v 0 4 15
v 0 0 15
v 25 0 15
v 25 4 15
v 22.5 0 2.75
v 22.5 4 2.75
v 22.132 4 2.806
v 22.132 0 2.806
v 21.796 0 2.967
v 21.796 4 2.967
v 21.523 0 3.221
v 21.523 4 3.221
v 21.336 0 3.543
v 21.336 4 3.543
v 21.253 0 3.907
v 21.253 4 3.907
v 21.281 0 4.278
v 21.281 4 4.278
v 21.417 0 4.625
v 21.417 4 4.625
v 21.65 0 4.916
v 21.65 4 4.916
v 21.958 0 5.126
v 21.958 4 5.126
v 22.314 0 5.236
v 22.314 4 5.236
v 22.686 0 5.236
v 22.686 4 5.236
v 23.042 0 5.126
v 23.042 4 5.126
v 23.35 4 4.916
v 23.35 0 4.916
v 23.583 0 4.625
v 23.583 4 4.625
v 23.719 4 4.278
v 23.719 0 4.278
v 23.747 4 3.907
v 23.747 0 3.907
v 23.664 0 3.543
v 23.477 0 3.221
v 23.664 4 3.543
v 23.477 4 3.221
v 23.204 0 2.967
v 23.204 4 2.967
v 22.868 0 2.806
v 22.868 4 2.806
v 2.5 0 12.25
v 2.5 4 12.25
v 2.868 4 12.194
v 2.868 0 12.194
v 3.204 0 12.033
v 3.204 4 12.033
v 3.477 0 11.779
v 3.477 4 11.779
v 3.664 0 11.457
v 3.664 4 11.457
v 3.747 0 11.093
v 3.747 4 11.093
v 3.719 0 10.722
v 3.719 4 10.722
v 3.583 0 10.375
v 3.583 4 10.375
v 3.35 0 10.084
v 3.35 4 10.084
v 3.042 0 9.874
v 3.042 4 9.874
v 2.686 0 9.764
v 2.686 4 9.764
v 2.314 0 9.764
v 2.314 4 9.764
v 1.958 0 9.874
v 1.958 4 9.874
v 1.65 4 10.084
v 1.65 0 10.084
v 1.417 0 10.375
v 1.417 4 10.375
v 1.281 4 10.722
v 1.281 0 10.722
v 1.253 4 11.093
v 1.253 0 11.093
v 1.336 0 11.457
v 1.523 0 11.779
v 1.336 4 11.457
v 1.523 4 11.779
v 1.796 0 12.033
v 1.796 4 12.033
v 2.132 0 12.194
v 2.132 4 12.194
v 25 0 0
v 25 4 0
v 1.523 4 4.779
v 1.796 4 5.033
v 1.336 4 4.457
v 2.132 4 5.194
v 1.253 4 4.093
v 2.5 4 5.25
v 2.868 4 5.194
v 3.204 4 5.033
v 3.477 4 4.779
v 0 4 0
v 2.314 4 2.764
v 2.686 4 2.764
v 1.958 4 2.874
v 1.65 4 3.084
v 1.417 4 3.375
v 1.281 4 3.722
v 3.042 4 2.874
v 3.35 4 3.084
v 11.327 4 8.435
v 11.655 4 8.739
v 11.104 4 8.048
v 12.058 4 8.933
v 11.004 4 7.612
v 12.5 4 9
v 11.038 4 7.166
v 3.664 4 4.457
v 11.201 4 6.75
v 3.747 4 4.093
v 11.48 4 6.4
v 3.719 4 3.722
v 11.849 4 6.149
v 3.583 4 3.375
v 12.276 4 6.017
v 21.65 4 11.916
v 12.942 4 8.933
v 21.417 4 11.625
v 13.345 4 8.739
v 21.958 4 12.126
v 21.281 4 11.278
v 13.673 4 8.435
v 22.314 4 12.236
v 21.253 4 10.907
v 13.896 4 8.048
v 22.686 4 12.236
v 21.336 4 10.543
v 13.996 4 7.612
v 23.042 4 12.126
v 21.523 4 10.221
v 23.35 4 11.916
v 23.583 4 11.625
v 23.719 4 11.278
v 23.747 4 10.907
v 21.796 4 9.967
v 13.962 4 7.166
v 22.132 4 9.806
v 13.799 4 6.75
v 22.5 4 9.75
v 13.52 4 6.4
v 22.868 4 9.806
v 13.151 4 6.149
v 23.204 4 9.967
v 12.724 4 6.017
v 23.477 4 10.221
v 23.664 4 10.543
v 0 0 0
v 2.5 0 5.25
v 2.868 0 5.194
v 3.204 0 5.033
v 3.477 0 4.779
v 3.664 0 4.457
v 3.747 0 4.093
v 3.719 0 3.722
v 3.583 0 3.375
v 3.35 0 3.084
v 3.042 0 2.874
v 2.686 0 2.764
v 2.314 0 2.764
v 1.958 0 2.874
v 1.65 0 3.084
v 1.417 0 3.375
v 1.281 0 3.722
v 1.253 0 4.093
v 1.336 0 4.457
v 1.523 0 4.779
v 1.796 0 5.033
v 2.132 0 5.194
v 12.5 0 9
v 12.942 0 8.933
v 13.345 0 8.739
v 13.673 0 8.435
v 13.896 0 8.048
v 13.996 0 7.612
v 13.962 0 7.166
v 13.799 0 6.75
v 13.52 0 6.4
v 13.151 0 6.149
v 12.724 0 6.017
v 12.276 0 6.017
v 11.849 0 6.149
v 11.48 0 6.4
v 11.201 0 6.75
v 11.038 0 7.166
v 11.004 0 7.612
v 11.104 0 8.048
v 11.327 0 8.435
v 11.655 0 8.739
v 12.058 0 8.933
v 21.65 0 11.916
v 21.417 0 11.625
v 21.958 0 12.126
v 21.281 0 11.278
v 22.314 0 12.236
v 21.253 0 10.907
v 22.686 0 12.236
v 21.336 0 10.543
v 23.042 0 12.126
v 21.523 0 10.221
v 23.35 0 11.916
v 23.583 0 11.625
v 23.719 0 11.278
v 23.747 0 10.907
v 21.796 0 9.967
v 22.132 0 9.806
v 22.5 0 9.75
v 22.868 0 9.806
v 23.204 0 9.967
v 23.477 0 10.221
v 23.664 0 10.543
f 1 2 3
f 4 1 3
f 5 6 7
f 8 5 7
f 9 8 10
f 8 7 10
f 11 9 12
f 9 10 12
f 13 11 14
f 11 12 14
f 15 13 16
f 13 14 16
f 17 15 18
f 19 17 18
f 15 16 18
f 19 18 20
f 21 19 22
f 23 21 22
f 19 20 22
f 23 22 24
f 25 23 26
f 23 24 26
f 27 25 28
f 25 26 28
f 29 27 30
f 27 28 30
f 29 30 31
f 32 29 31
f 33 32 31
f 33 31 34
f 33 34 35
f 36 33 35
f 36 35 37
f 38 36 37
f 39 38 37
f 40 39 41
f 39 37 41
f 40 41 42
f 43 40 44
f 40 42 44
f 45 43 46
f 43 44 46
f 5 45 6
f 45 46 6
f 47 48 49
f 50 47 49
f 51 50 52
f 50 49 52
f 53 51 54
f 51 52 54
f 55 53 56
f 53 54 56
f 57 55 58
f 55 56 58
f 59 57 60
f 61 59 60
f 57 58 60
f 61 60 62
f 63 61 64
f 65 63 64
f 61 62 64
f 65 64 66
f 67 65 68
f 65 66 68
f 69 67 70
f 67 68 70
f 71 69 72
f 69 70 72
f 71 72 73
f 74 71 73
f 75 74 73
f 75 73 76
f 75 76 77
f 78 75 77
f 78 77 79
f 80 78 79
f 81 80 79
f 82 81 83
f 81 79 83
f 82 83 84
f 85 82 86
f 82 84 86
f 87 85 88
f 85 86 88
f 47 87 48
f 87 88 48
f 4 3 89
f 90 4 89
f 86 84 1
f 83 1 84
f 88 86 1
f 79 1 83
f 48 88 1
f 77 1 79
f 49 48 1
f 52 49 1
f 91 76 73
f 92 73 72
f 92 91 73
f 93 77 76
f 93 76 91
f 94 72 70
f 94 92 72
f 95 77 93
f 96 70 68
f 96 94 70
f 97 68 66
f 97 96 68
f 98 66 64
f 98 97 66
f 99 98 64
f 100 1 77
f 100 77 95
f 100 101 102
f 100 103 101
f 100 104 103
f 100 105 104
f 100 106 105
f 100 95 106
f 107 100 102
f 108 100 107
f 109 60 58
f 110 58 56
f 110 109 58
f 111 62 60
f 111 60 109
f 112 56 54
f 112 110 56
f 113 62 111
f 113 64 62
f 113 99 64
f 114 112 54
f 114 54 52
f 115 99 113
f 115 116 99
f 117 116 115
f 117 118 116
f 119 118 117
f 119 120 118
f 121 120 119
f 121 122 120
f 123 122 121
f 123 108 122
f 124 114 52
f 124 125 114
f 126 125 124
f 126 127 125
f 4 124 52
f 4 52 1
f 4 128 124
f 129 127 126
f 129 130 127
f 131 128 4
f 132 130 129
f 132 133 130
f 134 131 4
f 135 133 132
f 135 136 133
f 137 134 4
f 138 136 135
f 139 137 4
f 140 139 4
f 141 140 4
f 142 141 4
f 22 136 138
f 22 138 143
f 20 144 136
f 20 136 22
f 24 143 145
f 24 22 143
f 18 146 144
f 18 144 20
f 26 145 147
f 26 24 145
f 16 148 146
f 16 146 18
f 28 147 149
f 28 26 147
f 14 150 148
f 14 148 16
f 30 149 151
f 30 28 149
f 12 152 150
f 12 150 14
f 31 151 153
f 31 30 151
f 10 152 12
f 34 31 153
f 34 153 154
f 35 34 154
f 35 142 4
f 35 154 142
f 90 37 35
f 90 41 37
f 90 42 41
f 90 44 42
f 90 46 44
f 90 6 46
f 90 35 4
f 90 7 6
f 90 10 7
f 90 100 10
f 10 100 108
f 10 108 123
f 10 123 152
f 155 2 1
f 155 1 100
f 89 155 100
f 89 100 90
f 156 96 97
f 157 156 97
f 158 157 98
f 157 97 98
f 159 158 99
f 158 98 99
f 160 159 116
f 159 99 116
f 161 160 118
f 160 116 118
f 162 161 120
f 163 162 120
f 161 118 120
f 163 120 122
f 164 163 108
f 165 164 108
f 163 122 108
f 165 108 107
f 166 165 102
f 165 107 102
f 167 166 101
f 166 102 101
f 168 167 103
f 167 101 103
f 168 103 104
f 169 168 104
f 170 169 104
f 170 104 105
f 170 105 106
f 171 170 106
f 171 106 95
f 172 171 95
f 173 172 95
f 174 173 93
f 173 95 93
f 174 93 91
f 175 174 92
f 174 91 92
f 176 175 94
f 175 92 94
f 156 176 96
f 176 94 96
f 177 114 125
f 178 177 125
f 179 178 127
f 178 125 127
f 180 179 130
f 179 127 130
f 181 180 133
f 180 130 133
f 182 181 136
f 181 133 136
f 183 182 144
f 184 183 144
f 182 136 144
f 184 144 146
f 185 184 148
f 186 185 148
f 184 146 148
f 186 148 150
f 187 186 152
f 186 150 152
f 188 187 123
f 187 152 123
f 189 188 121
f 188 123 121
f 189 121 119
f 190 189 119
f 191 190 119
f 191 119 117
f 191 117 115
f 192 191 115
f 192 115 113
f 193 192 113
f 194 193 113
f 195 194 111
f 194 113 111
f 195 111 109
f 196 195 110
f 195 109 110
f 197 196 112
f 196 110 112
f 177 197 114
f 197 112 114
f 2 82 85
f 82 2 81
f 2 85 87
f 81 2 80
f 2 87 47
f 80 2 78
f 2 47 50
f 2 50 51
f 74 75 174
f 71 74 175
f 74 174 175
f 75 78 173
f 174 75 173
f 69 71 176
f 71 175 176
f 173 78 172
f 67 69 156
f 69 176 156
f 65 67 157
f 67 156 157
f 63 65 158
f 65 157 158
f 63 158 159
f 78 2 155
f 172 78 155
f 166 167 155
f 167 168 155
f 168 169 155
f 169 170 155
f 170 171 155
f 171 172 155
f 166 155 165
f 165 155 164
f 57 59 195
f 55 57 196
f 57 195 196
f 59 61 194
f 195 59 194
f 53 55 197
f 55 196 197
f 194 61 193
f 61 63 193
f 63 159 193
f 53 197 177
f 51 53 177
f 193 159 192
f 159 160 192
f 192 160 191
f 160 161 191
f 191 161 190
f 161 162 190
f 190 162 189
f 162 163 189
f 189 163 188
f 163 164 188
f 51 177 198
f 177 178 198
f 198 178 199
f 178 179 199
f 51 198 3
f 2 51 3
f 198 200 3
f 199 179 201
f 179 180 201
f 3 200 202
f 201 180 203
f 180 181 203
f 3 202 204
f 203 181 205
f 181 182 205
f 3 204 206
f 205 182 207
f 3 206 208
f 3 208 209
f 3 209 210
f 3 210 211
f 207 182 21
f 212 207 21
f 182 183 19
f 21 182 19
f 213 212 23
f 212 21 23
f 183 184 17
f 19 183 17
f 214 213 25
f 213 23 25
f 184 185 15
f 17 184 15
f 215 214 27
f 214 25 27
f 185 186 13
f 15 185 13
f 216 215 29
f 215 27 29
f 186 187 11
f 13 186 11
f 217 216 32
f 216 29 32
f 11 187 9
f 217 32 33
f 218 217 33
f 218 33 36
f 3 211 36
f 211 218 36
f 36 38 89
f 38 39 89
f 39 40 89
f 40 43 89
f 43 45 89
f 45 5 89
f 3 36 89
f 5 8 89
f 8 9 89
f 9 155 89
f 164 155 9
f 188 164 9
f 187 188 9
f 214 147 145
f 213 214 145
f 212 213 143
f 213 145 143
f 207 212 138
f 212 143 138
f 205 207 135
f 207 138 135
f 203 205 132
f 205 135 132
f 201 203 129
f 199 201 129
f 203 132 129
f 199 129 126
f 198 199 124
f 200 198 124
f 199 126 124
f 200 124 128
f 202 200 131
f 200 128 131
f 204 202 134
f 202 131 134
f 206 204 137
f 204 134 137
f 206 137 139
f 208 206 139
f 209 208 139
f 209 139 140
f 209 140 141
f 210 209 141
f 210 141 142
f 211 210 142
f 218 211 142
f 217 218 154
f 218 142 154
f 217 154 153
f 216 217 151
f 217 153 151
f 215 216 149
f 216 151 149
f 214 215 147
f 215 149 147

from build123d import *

# Parameters (mm, degrees)
SKETCH_1_W          = 25
SKETCH_1_H          = 15
EXTRUDE_1_DEPTH     = 4
SKETCH_2_R          = 1.25
SKETCH_2_R_2        = 1.5
CUT_EXTRUDE_1_DEPTH = 4


with BuildPart() as part:
    # 草图1 → 凸台-拉伸1 (new body)
    with BuildSketch(Plane(origin=(0, 0, 0), x_dir=(1, 0, 0), z_dir=(0, 1, 0))):
        with Locations((12.5, -7.5)):
            Rectangle(SKETCH_1_W, SKETCH_1_H)
    extrude(amount=EXTRUDE_1_DEPTH)

    # 草图2 → 切除-拉伸1 (cut)
    with BuildSketch(Plane(origin=(0, 4, 0), x_dir=(1, 0, 0), z_dir=(0, 1, 0))):
        with Locations(Location((2.5, -4, 0), (0, 0, 270))):
            Circle(SKETCH_2_R)
        with Locations(Location((2.5, -11, 0), (0, 0, 270))):
            Circle(SKETCH_2_R)
        with Locations(Location((22.5, -11, 0), (0, 0, 90))):
            Circle(SKETCH_2_R)
        with Locations(Location((22.5, -4, 0), (0, 0, 90))):
            Circle(SKETCH_2_R)
        with Locations(Location((12.5, -7.5, 0), (0, 0, 270))):
            Circle(SKETCH_2_R_2)
    extrude(amount=-CUT_EXTRUDE_1_DEPTH, mode=Mode.SUBTRACT)


solid = part.part
